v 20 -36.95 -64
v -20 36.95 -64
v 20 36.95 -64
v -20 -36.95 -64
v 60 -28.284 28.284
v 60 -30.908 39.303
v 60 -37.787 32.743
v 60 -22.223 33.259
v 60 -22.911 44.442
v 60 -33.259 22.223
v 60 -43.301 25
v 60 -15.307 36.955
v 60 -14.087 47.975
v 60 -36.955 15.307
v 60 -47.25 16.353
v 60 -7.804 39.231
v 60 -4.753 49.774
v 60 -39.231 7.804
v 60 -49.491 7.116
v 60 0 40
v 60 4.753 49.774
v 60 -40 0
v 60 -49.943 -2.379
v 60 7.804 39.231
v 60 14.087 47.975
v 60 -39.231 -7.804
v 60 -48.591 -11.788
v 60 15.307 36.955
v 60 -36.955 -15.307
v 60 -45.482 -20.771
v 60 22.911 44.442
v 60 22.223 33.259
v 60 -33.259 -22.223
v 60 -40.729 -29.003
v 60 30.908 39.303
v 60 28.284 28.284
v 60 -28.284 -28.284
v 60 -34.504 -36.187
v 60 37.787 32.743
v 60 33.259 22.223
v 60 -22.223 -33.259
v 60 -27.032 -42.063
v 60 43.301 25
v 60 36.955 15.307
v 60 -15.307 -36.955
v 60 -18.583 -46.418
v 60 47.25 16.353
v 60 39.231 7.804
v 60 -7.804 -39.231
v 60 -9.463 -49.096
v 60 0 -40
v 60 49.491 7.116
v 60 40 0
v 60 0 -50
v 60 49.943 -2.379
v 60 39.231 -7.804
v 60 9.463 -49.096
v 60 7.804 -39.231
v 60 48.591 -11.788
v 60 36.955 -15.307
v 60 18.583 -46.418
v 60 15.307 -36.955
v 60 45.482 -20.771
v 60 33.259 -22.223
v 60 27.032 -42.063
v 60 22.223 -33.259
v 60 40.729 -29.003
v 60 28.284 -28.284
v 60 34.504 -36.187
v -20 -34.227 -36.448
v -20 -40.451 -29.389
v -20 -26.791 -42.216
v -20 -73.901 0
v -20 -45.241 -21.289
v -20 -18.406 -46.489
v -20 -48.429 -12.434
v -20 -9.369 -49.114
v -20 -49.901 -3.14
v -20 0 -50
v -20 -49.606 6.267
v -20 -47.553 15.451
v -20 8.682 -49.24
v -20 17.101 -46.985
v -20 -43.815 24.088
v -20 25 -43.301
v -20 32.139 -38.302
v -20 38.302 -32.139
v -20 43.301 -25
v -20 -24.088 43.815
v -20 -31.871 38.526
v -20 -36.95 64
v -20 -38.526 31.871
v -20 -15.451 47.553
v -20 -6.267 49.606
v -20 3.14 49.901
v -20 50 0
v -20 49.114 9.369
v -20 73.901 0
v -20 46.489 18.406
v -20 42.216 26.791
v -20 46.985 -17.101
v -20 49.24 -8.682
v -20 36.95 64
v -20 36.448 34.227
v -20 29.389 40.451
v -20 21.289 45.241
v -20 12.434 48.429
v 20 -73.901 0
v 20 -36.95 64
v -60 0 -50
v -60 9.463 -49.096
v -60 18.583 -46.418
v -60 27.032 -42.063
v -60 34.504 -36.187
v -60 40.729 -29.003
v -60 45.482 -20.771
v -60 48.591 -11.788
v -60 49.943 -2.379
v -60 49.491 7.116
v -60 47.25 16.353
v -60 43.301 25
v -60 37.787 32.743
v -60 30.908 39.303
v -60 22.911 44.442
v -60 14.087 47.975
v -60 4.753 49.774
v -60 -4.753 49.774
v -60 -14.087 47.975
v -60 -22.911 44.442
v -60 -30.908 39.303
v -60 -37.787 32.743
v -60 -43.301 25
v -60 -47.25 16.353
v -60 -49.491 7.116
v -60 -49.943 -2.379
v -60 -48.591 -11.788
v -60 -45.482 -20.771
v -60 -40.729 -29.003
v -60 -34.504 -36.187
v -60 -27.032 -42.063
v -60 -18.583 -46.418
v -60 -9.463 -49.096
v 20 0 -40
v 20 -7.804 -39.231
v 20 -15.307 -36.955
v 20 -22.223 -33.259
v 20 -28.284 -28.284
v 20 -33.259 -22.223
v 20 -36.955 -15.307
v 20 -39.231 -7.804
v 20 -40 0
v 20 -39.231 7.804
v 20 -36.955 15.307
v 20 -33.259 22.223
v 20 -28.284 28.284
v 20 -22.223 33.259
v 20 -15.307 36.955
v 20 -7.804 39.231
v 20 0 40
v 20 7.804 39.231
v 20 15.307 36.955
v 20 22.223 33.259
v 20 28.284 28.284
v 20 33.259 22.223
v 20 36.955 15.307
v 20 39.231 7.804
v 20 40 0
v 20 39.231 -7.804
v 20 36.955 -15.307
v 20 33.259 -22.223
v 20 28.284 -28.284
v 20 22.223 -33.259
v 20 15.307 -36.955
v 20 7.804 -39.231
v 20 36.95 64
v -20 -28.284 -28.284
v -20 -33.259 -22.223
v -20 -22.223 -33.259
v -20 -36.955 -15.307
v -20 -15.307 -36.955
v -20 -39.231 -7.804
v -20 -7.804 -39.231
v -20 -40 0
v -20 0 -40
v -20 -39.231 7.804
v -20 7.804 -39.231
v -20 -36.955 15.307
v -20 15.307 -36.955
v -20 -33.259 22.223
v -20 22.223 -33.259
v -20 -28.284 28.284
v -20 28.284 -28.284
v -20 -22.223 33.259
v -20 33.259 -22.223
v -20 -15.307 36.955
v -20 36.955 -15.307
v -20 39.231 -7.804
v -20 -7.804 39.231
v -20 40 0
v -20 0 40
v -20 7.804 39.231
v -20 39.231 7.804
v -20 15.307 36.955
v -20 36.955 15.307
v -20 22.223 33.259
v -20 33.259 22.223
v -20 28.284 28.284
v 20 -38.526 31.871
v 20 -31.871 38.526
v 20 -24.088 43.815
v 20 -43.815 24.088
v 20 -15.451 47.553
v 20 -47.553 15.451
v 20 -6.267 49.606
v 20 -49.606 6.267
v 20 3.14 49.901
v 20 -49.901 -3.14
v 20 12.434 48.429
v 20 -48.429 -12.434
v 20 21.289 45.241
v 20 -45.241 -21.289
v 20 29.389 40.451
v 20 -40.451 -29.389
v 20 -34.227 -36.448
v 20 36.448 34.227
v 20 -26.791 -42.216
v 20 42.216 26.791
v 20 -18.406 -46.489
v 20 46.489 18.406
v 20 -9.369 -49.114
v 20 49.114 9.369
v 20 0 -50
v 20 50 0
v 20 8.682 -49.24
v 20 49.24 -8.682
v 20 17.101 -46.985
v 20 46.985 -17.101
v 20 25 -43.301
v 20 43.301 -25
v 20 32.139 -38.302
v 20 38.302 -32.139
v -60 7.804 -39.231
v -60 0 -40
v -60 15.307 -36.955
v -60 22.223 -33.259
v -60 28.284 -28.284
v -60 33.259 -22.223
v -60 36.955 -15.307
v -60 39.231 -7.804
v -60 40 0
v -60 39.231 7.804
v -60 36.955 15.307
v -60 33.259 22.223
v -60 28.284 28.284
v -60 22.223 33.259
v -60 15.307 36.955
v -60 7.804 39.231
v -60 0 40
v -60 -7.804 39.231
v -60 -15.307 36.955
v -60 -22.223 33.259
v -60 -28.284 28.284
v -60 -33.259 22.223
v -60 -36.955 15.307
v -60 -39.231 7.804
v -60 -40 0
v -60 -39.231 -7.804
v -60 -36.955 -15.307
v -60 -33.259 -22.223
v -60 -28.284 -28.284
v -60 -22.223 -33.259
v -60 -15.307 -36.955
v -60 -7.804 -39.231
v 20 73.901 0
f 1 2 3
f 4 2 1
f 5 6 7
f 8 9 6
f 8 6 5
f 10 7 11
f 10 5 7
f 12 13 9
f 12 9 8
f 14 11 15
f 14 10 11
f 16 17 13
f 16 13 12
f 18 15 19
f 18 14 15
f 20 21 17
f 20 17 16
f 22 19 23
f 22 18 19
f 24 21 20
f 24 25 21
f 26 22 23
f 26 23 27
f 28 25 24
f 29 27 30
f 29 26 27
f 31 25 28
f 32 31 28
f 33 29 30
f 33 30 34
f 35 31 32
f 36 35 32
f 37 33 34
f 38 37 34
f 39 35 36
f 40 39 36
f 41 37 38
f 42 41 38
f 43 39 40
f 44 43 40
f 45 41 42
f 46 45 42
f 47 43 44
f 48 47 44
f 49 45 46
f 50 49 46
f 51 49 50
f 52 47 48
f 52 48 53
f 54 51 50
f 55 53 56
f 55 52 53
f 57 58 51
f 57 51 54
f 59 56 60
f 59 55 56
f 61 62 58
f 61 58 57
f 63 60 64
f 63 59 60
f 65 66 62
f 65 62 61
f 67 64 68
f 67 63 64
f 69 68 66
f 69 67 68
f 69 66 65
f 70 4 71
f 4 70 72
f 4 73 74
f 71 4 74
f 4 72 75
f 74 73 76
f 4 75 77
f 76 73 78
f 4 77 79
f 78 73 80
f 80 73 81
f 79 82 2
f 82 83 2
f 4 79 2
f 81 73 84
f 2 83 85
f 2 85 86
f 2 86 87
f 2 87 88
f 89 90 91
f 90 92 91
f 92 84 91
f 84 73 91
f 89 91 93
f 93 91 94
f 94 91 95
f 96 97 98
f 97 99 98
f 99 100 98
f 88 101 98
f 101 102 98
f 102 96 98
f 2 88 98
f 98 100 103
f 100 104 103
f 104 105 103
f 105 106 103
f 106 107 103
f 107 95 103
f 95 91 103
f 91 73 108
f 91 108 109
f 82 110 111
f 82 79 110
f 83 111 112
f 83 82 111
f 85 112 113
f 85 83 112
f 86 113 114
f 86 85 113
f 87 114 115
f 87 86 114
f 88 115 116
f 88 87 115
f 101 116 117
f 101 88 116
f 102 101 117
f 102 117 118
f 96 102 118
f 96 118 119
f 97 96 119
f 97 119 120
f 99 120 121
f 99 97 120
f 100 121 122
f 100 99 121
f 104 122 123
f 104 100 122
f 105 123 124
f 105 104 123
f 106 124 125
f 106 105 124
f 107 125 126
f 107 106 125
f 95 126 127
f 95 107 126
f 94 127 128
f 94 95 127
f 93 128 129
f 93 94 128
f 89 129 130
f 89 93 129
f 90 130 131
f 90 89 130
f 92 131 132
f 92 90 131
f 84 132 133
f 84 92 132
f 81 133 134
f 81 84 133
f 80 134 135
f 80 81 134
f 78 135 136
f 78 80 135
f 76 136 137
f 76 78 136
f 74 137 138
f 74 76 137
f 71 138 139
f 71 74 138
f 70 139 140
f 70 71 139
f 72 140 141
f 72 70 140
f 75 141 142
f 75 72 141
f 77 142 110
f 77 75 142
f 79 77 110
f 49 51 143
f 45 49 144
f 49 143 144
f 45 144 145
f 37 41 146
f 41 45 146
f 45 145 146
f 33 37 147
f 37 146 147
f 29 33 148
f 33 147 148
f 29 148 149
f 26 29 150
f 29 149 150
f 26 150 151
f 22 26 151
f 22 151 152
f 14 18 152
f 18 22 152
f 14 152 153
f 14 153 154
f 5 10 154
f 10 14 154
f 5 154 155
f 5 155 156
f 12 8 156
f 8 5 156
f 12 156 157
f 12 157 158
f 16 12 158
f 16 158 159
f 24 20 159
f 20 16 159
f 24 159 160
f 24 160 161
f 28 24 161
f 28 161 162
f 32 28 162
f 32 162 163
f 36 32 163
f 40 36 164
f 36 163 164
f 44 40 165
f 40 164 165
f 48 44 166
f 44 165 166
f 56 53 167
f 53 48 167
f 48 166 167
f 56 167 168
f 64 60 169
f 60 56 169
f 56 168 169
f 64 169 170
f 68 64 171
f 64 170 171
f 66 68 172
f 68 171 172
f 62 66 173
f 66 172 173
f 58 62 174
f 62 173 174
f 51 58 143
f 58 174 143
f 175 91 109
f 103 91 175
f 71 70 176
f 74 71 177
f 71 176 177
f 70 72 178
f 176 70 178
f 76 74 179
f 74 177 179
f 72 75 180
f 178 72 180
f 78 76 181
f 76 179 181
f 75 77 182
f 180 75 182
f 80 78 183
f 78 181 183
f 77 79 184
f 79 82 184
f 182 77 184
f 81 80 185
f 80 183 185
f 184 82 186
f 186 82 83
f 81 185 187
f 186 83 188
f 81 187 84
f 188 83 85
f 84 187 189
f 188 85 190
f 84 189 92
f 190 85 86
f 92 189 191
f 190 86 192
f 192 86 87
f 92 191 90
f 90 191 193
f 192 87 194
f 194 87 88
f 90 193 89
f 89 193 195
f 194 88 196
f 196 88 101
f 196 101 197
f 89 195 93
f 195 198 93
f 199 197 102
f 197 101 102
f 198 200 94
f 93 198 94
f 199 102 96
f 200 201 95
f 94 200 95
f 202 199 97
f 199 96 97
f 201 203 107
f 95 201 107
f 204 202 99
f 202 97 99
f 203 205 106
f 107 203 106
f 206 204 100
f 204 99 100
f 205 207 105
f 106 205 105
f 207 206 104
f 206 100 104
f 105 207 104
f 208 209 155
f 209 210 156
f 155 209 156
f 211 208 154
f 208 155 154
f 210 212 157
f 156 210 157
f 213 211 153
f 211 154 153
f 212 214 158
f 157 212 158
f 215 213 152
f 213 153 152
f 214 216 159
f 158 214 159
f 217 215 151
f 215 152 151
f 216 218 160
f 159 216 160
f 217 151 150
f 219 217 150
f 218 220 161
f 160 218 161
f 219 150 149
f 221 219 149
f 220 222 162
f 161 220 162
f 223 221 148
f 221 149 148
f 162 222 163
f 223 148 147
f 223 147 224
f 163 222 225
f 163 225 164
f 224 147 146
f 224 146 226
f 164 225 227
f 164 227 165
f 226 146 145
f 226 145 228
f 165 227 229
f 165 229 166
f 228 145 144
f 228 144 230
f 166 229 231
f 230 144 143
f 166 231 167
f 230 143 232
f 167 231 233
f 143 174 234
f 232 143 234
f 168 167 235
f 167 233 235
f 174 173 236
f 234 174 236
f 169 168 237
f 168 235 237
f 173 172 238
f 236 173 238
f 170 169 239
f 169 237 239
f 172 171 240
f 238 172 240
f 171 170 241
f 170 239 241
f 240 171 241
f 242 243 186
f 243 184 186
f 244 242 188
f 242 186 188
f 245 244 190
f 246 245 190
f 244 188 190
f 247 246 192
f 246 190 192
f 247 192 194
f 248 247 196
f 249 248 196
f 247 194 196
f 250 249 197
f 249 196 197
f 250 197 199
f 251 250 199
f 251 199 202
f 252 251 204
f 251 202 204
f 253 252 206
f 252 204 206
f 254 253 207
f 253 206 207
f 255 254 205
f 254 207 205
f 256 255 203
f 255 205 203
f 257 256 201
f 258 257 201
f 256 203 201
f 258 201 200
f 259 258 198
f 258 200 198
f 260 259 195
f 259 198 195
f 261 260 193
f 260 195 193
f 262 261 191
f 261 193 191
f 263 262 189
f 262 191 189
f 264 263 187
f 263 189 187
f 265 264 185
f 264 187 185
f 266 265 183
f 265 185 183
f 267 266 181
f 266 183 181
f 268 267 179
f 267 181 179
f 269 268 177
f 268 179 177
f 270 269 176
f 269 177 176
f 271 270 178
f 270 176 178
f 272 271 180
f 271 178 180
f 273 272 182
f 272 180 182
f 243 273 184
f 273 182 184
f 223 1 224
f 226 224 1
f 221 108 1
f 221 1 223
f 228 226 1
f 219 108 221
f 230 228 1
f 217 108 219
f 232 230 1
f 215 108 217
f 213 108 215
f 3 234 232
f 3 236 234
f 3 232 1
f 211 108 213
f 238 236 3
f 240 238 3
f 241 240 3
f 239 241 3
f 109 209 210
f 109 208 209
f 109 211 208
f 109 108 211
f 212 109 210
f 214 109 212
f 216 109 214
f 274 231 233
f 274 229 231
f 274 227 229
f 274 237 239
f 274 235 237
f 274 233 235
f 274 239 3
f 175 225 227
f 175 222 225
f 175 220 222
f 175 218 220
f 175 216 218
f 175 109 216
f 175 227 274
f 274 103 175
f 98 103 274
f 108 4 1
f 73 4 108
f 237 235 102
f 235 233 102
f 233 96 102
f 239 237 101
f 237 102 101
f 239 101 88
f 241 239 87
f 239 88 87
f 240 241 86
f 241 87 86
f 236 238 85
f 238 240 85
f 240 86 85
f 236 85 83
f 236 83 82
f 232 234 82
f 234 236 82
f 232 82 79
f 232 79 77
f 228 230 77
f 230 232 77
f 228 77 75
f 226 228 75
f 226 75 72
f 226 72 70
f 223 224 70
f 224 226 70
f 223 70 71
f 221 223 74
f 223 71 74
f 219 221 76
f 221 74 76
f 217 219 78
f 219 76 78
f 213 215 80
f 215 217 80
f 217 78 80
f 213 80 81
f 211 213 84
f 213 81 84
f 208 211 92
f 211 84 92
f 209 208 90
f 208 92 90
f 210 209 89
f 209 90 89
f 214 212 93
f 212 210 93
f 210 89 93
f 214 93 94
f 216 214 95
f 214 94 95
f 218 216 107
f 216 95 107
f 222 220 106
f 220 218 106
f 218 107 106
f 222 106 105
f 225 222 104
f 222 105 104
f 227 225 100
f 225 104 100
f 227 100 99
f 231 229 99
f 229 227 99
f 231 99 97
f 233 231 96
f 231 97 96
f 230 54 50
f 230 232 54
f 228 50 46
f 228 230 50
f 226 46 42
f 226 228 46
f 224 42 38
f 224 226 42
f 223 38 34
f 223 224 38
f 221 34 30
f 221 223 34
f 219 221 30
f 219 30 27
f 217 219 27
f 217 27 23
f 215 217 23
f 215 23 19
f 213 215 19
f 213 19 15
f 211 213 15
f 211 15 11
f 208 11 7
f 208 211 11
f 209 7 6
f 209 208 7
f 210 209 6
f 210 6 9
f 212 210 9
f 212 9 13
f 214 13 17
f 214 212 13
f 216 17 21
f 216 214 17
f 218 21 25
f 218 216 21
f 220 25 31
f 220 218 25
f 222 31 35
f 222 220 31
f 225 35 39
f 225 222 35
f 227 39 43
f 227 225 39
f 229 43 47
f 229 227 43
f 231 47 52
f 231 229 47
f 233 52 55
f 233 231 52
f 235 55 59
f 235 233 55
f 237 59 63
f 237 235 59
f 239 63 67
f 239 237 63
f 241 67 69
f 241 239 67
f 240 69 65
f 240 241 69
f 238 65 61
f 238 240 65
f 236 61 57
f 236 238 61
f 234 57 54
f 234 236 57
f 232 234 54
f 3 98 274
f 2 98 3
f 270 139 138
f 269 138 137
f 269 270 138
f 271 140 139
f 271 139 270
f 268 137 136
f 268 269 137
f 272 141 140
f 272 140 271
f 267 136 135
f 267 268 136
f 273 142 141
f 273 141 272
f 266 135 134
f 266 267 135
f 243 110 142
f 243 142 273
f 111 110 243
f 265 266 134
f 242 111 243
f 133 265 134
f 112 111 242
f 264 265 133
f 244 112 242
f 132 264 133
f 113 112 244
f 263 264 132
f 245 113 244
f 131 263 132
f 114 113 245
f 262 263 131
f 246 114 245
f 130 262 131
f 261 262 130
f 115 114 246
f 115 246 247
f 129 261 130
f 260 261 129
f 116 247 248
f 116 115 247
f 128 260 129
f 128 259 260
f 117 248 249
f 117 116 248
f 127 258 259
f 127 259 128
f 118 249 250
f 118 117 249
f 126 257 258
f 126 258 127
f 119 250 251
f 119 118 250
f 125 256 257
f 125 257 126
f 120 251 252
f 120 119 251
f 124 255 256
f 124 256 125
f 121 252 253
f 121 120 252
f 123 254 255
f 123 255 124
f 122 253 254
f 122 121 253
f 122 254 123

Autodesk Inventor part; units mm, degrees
ref_plane "YZ Plane" through (0, 0, 0) normal (1, 0, 0) x (0, 1, 0)
ref_plane "XZ Plane" through (0, 0, 0) normal (0, 1, 0) x (-1, 0, 0)
ref_plane "XY Plane" through (0, 0, 0) normal (0, 0, 1) x (1, 0, 0)
sketch "Sketch1" plane through (0, 0, 0) normal (1, 0, 0) x (0, 1, 0)
  circle A0 centre (0, 0) radius 50
  line L0 (-36.9504, -64) -> (-73.9008, 0)
  line L1 (-73.9008, 0) -> (-36.9504, 64)
  line L2 (-36.9504, 64) -> (36.9504, 64)
  line L3 (36.9504, 64) -> (73.9008, 0)
  line L4 (73.9008, 0) -> (36.9504, -64)
  line L5 (36.9504, -64) -> (-36.9504, -64)
  dimension "d0" = 100
  dimension "d1" = 64
extrude "Extrusion1" add sketch "Sketch1" along normal mid plane 40
sketch "Sketch3" plane through (0, 0, 0) normal (1, 0, 0) x (0, 1, 0)
  circle A0 centre (0, 0) radius 50 projected
thread "Thread1" size "M100x6" class "6H" standard "ANSI Metric M Profile" full length
sketch "Sketch4" plane through (20, 0, 0) normal (1, 0, 0) x (0, 0, -1)
  circle A0 centre (0, 0) radius 50 projected
  circle A1 centre (0, 0) radius 40
  dimension "d12" = 10
extrude "Extrusion4" add sketch "Sketch4" along normal blind 40
thread "Thread2" size "M100x6" class "6g" standard "ANSI Metric M Profile" full length
mirror "Mirror1" about plane through (0, 0, 0) normal (1, 0, 0) of "Extrusion4"
thread "Thread3" size "M100x6" class "6g" standard "ANSI Metric M Profile" full length
properties part number "niple 4 inch"
